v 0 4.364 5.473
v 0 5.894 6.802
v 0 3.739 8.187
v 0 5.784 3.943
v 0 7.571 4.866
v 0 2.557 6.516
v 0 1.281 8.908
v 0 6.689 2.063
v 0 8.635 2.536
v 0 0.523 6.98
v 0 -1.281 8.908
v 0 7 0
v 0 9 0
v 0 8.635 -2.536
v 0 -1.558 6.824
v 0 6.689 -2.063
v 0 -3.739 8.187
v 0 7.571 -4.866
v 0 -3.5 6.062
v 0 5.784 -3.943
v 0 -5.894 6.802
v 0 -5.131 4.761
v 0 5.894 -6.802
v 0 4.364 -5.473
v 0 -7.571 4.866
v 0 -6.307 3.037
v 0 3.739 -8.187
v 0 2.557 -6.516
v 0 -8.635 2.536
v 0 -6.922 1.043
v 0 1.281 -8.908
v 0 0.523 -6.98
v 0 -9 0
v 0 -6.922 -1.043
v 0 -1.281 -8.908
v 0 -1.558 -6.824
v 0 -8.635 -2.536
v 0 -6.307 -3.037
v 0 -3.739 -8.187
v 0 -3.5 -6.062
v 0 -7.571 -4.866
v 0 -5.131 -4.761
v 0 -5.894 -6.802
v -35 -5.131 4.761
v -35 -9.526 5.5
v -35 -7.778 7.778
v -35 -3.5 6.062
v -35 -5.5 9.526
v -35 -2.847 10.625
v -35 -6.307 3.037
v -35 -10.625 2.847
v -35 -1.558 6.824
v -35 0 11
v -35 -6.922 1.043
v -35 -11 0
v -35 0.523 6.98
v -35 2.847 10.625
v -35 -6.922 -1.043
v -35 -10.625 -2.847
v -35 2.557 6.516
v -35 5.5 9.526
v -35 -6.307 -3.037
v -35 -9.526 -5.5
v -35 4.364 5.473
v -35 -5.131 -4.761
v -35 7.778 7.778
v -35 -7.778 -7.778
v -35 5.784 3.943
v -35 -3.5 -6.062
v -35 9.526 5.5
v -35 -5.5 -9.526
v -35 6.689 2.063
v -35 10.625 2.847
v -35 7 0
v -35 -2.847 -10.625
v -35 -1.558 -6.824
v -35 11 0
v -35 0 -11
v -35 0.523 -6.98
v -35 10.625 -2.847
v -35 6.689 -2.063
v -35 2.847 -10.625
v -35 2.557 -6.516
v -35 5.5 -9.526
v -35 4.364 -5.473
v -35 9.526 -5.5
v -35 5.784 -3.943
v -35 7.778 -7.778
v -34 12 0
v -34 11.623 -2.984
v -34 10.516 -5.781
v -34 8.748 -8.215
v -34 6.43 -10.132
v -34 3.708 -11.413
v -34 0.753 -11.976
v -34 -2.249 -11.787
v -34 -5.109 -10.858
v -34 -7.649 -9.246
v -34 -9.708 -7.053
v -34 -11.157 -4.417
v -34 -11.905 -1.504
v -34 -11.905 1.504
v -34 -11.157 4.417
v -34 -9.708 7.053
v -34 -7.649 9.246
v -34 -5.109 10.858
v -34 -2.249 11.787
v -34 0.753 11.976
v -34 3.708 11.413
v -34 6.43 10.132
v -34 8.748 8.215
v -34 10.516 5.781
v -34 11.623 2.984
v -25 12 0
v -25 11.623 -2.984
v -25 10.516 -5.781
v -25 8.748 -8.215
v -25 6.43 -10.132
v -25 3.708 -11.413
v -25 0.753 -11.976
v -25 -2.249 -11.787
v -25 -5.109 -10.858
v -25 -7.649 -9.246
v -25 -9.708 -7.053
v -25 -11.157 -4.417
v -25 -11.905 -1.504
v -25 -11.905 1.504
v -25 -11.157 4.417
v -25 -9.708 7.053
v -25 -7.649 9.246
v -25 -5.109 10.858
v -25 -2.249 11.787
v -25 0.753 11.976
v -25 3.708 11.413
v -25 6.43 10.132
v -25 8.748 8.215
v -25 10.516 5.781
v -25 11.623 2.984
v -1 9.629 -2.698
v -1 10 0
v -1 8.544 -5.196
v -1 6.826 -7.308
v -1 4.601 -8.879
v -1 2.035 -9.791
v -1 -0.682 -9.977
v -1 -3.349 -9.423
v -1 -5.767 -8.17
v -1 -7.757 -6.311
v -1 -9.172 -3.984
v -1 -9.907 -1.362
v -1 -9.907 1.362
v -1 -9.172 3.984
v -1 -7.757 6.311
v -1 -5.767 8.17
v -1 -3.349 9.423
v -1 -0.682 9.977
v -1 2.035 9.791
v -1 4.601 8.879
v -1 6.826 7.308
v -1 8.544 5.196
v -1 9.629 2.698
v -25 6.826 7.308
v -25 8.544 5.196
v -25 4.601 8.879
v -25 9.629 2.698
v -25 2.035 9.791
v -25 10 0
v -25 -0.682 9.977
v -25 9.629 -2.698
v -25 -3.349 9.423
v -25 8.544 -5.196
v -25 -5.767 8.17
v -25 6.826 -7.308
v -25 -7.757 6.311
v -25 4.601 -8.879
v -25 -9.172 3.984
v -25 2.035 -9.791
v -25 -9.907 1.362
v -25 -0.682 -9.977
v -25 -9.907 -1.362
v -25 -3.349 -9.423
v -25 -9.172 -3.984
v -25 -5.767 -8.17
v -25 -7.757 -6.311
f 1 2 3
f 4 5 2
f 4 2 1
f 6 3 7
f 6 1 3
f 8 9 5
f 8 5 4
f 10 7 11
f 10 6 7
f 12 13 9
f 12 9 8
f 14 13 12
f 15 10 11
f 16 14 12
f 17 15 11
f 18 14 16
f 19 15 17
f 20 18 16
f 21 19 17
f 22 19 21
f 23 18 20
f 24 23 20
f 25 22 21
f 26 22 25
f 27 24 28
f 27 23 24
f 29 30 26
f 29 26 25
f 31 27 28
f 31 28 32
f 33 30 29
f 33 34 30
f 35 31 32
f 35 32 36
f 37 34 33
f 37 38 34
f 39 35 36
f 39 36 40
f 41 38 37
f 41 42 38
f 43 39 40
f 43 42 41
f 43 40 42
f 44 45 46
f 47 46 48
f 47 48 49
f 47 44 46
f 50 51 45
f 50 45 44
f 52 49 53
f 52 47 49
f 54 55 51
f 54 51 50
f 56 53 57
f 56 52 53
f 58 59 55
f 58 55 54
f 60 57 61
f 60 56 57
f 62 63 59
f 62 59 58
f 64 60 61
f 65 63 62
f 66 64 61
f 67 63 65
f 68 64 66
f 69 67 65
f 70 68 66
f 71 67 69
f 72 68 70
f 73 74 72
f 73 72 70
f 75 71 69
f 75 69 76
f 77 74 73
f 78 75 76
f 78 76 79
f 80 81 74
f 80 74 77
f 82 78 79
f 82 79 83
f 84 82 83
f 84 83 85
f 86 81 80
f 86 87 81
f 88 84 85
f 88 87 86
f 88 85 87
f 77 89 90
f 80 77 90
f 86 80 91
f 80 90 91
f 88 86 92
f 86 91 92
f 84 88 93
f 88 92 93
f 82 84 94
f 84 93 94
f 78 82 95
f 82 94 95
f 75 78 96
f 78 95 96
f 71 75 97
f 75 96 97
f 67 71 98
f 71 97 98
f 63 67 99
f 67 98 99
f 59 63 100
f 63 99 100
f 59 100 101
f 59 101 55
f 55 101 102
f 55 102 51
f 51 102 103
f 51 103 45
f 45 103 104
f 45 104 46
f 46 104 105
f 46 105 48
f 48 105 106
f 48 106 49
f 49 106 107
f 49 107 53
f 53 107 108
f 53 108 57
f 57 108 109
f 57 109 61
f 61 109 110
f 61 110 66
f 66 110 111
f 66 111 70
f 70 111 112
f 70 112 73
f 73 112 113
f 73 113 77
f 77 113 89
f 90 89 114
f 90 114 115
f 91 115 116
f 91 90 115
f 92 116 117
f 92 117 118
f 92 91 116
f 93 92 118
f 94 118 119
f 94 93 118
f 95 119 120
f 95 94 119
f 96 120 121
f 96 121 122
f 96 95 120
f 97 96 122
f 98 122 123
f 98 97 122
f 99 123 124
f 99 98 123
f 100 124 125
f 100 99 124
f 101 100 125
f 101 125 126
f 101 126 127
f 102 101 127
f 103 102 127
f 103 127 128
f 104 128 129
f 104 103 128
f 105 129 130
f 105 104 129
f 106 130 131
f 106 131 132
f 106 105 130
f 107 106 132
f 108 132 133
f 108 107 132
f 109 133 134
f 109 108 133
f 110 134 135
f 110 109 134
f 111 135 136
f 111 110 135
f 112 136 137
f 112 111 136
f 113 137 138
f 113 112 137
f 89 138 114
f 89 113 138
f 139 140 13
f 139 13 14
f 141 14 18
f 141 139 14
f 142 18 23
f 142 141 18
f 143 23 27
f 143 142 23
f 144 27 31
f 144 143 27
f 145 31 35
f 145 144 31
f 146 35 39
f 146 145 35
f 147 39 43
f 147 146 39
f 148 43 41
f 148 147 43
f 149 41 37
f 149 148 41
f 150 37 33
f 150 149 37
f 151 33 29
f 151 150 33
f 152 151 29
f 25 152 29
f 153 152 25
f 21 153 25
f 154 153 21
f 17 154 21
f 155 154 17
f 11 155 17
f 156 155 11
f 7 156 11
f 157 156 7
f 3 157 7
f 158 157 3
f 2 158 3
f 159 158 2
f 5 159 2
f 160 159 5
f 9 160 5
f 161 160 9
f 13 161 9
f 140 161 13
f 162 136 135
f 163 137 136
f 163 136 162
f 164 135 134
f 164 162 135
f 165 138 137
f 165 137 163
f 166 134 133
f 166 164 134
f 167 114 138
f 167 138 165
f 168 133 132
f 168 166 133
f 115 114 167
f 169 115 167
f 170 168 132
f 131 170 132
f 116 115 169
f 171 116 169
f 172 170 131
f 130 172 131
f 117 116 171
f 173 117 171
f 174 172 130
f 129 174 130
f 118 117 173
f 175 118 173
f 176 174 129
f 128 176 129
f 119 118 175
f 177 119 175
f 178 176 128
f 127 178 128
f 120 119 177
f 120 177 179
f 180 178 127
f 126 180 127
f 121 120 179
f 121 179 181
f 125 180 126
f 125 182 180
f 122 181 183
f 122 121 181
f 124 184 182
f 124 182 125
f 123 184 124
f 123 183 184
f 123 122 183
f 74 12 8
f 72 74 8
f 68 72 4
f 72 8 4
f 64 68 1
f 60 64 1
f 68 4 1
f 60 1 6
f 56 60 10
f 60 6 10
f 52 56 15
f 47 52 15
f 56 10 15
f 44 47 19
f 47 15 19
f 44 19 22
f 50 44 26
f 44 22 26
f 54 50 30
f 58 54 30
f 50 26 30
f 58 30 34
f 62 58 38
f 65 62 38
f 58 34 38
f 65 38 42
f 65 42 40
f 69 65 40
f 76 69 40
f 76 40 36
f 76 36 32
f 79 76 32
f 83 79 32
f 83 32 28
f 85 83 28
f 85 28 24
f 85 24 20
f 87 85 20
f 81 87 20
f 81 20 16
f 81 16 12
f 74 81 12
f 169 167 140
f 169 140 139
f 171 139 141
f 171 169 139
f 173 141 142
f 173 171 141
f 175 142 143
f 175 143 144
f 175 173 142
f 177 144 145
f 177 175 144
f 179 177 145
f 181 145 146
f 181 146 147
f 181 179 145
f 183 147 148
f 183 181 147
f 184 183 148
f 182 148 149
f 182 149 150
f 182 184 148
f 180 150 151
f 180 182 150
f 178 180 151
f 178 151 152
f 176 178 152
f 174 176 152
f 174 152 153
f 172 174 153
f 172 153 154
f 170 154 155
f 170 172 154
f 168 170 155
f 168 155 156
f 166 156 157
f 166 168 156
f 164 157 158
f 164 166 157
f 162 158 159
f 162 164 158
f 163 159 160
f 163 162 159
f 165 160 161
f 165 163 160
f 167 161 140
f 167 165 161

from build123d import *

# Parameters (mm, degrees)
SKETCH3_R          = 7
CUT_EXTRUDE1_DEPTH = 39.897300678
CHAMFER1_SIZE      = 1


with BuildPart() as part:
    # Sketch1 → Revolve1 (revolve)
    with BuildSketch(Plane.XY, mode=Mode.PRIVATE) as revolve1_sk:
        Polygon((0, 0), (0, -10), (-25, -10), (-25, -12), (-35, -12), (-35, 0), align=None)
    revolve(revolve1_sk.sketch.rotate(Axis((0, 0, 0), (-1, 0, 0)), 180), axis=Axis((0, 0, 0), (-1, 0, 0)))

    # Sketch3 → Cut-Extrude1 (cut, through all)
    with BuildSketch(Plane(origin=(0, 0, 0), x_dir=(0, 0, -1), z_dir=(1, 0, 0))):
        with Locations(Location((0, 0, 0), (0, 0, 90))):
            Circle(SKETCH3_R)
    extrude(amount=-CUT_EXTRUDE1_DEPTH, mode=Mode.SUBTRACT)

    # Chamfer1
    chamfer1_edges = [part.edges().sort_by_distance(p)[0] for p in [
        (-35, -12, 0),
        (0, -10, 0),
    ]]
    chamfer(chamfer1_edges, length=CHAMFER1_SIZE)


solid = part.part
